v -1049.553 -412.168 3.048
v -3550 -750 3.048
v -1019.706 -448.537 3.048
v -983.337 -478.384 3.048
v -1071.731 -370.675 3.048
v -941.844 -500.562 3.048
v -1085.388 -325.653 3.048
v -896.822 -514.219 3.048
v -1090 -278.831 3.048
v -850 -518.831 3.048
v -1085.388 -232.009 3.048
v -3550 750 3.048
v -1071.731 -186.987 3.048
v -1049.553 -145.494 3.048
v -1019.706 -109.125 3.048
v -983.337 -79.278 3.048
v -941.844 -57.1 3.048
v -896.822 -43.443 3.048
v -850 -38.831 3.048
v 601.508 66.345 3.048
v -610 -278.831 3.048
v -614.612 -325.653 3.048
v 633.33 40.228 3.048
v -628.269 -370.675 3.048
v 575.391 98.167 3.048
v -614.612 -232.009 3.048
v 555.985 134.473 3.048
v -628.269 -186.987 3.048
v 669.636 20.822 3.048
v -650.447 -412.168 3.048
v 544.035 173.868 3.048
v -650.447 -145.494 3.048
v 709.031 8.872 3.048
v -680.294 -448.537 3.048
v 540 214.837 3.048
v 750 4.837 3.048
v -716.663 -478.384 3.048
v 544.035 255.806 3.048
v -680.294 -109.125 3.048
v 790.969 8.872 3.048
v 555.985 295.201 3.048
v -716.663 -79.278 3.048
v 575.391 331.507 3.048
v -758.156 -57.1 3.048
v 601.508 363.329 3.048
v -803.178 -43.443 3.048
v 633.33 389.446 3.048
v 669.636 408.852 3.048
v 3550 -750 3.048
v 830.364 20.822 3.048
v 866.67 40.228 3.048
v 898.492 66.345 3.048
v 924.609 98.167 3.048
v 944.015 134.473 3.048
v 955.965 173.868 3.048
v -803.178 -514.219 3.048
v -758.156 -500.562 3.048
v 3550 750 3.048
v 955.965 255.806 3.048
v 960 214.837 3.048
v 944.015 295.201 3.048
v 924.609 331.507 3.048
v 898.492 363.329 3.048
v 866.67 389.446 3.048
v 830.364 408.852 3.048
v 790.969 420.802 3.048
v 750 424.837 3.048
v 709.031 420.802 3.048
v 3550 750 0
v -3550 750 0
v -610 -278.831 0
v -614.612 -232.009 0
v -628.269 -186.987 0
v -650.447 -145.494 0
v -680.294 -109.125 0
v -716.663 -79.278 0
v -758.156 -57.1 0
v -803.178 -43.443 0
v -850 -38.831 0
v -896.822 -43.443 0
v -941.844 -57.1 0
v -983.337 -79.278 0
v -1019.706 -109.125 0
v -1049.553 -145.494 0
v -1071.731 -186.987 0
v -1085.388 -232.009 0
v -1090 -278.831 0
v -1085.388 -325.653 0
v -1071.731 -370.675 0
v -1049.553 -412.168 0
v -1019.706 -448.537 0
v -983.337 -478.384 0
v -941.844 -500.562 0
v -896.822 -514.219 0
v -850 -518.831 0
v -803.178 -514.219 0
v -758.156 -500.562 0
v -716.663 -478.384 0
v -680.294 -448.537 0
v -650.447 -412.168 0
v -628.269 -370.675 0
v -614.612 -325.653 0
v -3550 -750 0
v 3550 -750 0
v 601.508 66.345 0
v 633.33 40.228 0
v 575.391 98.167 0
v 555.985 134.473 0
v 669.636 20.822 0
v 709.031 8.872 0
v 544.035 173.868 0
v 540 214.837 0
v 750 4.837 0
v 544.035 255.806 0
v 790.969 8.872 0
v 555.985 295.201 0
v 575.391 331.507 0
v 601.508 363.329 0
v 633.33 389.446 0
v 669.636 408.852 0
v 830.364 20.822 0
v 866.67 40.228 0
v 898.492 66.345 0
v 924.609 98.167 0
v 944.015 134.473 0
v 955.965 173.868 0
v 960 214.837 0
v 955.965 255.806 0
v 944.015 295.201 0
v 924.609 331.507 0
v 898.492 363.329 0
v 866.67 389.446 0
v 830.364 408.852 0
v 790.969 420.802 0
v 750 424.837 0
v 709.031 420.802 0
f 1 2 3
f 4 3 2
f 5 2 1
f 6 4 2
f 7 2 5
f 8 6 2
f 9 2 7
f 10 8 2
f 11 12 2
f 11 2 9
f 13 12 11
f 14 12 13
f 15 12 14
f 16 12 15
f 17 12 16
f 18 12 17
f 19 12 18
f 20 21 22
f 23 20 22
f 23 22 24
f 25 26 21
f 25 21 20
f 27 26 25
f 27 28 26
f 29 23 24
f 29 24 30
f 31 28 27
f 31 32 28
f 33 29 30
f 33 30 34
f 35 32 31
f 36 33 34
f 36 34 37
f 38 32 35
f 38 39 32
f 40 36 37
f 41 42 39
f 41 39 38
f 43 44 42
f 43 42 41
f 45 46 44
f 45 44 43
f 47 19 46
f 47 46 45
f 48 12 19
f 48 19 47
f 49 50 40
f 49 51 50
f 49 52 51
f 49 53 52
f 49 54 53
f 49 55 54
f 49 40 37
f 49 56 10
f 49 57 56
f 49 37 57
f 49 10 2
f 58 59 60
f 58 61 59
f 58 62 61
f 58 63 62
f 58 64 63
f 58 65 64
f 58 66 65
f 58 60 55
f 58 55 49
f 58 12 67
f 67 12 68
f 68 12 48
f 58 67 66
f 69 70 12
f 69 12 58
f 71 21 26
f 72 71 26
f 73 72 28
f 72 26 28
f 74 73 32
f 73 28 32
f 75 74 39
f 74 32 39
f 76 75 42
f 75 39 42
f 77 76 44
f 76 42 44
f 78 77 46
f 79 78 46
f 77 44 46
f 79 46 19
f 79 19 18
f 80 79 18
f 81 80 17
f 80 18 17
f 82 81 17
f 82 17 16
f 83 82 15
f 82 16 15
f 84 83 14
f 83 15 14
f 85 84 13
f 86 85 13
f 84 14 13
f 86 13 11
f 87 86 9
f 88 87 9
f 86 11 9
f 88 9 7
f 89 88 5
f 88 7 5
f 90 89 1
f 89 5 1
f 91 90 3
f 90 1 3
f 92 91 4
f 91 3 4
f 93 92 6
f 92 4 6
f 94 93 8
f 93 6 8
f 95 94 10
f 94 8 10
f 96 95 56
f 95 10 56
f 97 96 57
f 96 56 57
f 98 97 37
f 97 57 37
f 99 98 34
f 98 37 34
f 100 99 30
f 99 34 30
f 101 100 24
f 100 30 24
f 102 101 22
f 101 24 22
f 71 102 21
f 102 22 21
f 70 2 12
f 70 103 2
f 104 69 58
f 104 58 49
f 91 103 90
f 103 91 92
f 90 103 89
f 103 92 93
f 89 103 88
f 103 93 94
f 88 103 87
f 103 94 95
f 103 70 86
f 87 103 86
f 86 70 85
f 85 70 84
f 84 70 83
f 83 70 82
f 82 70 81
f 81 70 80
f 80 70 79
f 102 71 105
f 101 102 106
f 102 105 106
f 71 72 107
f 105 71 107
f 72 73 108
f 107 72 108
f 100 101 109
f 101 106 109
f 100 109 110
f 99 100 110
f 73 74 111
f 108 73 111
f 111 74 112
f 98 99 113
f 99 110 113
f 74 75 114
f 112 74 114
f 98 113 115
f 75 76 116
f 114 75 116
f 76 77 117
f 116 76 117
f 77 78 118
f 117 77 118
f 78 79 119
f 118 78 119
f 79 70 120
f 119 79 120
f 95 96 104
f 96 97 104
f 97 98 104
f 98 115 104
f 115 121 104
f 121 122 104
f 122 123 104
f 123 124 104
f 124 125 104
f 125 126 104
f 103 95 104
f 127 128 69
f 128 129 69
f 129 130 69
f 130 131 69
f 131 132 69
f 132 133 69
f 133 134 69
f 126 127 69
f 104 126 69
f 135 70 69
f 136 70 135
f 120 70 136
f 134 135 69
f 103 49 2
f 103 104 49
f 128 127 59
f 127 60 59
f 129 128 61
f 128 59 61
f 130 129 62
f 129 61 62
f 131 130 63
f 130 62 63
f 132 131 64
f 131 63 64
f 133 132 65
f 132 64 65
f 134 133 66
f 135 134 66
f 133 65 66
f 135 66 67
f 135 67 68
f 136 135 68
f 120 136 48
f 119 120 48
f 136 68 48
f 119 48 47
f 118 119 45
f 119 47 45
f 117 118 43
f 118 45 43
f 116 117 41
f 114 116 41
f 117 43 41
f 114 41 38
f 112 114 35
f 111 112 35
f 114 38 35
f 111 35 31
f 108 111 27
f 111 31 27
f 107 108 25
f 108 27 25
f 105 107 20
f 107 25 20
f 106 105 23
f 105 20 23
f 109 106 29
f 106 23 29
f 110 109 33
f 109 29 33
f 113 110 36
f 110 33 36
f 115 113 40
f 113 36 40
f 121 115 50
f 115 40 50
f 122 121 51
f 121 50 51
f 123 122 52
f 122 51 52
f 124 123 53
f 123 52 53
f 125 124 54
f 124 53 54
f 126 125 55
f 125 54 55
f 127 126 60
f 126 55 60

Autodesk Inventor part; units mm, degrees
ref_plane "YZ Plane" through (0, 0, 0) normal (1, 0, 0) x (0, 1, 0)
ref_plane "XZ Plane" through (0, 0, 0) normal (0, 1, 0) x (-1, 0, 0)
ref_plane "XY Plane" through (0, 0, 0) normal (0, 0, 1) x (1, 0, 0)
sketch "Sketch1" plane through (0, 0, 0) normal (0, 0, 1) x (1, 0, 0)
  line L0 (3550, -750) -> (-3550, -750)
  line L1 (-3550, -750) -> (-3550, 750)
  line L2 (-3550, 750) -> (3550, 750)
  line L3 (3550, 750) -> (3550, -750)
  line L4 (3550, -750) -> (-3550, 750) construction
  line L5 (-3550, -750) -> (3550, 750) construction
  point P0 (0, 0)
  dimension "d6" = 7100
extrude "Plate1" add sketch "Sketch1" along normal blind 3.048
sketch "Sketch2" plane through (0, 0, 3.048) normal (0, 0, 1) x (1, 0, 0)
  circle A0 centre (750, 214.837) radius 210
  circle A1 centre (-850, -278.831) radius 240
  line L0 (-3550, -750) -> (-3550, 750) projected
  point P0 (0, 0)
  dimension "d2" = 4300
  dimension "d3" = 2700
  dimension "d11" = 420
  dimension "d12" = 480
extrude "Cut1" cut sketch "Sketch2" against normal blind 3.048
sketch "Sketch3" plane through (0, 0, 3.048) normal (0, 0, 1) x (1, 0, 0)
  line L0 (3550, 750) -> (-3550, 750) projected
  line L1 (-550, 750) -> (-550, -750)
  line L2 (-3550, -750) -> (3550, -750) projected
  line L3 (2450, 750) -> (2450, -750)
  line L4 (3700, -750) -> (3700, 750)
  line L5 (-3550, -750) -> (-3550, 750) projected
  line L6 (3701, 750) -> (3701, -750)
  circle A0 centre (750, 214.837) radius 210 projected
  line L7 (540, 214.837) -> (540, -750)
  line L8 (960, 214.837) -> (960, -750)
  circle A1 centre (-850, -278.831) radius 240 projected
  line L9 (-610, -278.831) -> (-610, -750)
  line L10 (-1090, -278.831) -> (-1090, -750)
  point P0 (0, 0)
  dimension "d7" = 3000
  dimension "d8" = 3000
  dimension "d9" = 1250
  dimension "d10" = 1
equation "\"d6\" = Length"
equation "\"d2\" = Hole1"
equation "\"d3\" = Hole2"
equation "\"d4\" = Thickness"
equation "\"d7\" = S1"
equation "\"d8\" = S2"
equation "\"d9\" = S3"
equation "\"d10\" = S4"
equation "\"d1\" = Thickness"
equation "\"BendRadius\" = Thickness"
equation "\"BendReliefWidth\" = Thickness"
equation "\"BendReliefDepth\" = 0.5 * Thickness"
equation "\"CornerReliefSize\" = 4 * Thickness"
equation "\"MinimumRemnant\" = 2 * Thickness"
equation "\"TransitionRadius\" = BendRadius"
equation "\"JacobiRadiusSize\" = BendRadius"
equation "\"GapSize\" = Thickness"
equation "\"Length\" = 7100"
equation "\"Hole1\" = 4300"
equation "\"Hole2\" = 2700"
equation "\"S1\" = 3000"
equation "\"S2\" = 3000"
equation "\"S3\" = 1250"
equation "\"S4\" = 1"
equation "\"Thickness\" = 3.048"
properties part number "Sheet divider"
